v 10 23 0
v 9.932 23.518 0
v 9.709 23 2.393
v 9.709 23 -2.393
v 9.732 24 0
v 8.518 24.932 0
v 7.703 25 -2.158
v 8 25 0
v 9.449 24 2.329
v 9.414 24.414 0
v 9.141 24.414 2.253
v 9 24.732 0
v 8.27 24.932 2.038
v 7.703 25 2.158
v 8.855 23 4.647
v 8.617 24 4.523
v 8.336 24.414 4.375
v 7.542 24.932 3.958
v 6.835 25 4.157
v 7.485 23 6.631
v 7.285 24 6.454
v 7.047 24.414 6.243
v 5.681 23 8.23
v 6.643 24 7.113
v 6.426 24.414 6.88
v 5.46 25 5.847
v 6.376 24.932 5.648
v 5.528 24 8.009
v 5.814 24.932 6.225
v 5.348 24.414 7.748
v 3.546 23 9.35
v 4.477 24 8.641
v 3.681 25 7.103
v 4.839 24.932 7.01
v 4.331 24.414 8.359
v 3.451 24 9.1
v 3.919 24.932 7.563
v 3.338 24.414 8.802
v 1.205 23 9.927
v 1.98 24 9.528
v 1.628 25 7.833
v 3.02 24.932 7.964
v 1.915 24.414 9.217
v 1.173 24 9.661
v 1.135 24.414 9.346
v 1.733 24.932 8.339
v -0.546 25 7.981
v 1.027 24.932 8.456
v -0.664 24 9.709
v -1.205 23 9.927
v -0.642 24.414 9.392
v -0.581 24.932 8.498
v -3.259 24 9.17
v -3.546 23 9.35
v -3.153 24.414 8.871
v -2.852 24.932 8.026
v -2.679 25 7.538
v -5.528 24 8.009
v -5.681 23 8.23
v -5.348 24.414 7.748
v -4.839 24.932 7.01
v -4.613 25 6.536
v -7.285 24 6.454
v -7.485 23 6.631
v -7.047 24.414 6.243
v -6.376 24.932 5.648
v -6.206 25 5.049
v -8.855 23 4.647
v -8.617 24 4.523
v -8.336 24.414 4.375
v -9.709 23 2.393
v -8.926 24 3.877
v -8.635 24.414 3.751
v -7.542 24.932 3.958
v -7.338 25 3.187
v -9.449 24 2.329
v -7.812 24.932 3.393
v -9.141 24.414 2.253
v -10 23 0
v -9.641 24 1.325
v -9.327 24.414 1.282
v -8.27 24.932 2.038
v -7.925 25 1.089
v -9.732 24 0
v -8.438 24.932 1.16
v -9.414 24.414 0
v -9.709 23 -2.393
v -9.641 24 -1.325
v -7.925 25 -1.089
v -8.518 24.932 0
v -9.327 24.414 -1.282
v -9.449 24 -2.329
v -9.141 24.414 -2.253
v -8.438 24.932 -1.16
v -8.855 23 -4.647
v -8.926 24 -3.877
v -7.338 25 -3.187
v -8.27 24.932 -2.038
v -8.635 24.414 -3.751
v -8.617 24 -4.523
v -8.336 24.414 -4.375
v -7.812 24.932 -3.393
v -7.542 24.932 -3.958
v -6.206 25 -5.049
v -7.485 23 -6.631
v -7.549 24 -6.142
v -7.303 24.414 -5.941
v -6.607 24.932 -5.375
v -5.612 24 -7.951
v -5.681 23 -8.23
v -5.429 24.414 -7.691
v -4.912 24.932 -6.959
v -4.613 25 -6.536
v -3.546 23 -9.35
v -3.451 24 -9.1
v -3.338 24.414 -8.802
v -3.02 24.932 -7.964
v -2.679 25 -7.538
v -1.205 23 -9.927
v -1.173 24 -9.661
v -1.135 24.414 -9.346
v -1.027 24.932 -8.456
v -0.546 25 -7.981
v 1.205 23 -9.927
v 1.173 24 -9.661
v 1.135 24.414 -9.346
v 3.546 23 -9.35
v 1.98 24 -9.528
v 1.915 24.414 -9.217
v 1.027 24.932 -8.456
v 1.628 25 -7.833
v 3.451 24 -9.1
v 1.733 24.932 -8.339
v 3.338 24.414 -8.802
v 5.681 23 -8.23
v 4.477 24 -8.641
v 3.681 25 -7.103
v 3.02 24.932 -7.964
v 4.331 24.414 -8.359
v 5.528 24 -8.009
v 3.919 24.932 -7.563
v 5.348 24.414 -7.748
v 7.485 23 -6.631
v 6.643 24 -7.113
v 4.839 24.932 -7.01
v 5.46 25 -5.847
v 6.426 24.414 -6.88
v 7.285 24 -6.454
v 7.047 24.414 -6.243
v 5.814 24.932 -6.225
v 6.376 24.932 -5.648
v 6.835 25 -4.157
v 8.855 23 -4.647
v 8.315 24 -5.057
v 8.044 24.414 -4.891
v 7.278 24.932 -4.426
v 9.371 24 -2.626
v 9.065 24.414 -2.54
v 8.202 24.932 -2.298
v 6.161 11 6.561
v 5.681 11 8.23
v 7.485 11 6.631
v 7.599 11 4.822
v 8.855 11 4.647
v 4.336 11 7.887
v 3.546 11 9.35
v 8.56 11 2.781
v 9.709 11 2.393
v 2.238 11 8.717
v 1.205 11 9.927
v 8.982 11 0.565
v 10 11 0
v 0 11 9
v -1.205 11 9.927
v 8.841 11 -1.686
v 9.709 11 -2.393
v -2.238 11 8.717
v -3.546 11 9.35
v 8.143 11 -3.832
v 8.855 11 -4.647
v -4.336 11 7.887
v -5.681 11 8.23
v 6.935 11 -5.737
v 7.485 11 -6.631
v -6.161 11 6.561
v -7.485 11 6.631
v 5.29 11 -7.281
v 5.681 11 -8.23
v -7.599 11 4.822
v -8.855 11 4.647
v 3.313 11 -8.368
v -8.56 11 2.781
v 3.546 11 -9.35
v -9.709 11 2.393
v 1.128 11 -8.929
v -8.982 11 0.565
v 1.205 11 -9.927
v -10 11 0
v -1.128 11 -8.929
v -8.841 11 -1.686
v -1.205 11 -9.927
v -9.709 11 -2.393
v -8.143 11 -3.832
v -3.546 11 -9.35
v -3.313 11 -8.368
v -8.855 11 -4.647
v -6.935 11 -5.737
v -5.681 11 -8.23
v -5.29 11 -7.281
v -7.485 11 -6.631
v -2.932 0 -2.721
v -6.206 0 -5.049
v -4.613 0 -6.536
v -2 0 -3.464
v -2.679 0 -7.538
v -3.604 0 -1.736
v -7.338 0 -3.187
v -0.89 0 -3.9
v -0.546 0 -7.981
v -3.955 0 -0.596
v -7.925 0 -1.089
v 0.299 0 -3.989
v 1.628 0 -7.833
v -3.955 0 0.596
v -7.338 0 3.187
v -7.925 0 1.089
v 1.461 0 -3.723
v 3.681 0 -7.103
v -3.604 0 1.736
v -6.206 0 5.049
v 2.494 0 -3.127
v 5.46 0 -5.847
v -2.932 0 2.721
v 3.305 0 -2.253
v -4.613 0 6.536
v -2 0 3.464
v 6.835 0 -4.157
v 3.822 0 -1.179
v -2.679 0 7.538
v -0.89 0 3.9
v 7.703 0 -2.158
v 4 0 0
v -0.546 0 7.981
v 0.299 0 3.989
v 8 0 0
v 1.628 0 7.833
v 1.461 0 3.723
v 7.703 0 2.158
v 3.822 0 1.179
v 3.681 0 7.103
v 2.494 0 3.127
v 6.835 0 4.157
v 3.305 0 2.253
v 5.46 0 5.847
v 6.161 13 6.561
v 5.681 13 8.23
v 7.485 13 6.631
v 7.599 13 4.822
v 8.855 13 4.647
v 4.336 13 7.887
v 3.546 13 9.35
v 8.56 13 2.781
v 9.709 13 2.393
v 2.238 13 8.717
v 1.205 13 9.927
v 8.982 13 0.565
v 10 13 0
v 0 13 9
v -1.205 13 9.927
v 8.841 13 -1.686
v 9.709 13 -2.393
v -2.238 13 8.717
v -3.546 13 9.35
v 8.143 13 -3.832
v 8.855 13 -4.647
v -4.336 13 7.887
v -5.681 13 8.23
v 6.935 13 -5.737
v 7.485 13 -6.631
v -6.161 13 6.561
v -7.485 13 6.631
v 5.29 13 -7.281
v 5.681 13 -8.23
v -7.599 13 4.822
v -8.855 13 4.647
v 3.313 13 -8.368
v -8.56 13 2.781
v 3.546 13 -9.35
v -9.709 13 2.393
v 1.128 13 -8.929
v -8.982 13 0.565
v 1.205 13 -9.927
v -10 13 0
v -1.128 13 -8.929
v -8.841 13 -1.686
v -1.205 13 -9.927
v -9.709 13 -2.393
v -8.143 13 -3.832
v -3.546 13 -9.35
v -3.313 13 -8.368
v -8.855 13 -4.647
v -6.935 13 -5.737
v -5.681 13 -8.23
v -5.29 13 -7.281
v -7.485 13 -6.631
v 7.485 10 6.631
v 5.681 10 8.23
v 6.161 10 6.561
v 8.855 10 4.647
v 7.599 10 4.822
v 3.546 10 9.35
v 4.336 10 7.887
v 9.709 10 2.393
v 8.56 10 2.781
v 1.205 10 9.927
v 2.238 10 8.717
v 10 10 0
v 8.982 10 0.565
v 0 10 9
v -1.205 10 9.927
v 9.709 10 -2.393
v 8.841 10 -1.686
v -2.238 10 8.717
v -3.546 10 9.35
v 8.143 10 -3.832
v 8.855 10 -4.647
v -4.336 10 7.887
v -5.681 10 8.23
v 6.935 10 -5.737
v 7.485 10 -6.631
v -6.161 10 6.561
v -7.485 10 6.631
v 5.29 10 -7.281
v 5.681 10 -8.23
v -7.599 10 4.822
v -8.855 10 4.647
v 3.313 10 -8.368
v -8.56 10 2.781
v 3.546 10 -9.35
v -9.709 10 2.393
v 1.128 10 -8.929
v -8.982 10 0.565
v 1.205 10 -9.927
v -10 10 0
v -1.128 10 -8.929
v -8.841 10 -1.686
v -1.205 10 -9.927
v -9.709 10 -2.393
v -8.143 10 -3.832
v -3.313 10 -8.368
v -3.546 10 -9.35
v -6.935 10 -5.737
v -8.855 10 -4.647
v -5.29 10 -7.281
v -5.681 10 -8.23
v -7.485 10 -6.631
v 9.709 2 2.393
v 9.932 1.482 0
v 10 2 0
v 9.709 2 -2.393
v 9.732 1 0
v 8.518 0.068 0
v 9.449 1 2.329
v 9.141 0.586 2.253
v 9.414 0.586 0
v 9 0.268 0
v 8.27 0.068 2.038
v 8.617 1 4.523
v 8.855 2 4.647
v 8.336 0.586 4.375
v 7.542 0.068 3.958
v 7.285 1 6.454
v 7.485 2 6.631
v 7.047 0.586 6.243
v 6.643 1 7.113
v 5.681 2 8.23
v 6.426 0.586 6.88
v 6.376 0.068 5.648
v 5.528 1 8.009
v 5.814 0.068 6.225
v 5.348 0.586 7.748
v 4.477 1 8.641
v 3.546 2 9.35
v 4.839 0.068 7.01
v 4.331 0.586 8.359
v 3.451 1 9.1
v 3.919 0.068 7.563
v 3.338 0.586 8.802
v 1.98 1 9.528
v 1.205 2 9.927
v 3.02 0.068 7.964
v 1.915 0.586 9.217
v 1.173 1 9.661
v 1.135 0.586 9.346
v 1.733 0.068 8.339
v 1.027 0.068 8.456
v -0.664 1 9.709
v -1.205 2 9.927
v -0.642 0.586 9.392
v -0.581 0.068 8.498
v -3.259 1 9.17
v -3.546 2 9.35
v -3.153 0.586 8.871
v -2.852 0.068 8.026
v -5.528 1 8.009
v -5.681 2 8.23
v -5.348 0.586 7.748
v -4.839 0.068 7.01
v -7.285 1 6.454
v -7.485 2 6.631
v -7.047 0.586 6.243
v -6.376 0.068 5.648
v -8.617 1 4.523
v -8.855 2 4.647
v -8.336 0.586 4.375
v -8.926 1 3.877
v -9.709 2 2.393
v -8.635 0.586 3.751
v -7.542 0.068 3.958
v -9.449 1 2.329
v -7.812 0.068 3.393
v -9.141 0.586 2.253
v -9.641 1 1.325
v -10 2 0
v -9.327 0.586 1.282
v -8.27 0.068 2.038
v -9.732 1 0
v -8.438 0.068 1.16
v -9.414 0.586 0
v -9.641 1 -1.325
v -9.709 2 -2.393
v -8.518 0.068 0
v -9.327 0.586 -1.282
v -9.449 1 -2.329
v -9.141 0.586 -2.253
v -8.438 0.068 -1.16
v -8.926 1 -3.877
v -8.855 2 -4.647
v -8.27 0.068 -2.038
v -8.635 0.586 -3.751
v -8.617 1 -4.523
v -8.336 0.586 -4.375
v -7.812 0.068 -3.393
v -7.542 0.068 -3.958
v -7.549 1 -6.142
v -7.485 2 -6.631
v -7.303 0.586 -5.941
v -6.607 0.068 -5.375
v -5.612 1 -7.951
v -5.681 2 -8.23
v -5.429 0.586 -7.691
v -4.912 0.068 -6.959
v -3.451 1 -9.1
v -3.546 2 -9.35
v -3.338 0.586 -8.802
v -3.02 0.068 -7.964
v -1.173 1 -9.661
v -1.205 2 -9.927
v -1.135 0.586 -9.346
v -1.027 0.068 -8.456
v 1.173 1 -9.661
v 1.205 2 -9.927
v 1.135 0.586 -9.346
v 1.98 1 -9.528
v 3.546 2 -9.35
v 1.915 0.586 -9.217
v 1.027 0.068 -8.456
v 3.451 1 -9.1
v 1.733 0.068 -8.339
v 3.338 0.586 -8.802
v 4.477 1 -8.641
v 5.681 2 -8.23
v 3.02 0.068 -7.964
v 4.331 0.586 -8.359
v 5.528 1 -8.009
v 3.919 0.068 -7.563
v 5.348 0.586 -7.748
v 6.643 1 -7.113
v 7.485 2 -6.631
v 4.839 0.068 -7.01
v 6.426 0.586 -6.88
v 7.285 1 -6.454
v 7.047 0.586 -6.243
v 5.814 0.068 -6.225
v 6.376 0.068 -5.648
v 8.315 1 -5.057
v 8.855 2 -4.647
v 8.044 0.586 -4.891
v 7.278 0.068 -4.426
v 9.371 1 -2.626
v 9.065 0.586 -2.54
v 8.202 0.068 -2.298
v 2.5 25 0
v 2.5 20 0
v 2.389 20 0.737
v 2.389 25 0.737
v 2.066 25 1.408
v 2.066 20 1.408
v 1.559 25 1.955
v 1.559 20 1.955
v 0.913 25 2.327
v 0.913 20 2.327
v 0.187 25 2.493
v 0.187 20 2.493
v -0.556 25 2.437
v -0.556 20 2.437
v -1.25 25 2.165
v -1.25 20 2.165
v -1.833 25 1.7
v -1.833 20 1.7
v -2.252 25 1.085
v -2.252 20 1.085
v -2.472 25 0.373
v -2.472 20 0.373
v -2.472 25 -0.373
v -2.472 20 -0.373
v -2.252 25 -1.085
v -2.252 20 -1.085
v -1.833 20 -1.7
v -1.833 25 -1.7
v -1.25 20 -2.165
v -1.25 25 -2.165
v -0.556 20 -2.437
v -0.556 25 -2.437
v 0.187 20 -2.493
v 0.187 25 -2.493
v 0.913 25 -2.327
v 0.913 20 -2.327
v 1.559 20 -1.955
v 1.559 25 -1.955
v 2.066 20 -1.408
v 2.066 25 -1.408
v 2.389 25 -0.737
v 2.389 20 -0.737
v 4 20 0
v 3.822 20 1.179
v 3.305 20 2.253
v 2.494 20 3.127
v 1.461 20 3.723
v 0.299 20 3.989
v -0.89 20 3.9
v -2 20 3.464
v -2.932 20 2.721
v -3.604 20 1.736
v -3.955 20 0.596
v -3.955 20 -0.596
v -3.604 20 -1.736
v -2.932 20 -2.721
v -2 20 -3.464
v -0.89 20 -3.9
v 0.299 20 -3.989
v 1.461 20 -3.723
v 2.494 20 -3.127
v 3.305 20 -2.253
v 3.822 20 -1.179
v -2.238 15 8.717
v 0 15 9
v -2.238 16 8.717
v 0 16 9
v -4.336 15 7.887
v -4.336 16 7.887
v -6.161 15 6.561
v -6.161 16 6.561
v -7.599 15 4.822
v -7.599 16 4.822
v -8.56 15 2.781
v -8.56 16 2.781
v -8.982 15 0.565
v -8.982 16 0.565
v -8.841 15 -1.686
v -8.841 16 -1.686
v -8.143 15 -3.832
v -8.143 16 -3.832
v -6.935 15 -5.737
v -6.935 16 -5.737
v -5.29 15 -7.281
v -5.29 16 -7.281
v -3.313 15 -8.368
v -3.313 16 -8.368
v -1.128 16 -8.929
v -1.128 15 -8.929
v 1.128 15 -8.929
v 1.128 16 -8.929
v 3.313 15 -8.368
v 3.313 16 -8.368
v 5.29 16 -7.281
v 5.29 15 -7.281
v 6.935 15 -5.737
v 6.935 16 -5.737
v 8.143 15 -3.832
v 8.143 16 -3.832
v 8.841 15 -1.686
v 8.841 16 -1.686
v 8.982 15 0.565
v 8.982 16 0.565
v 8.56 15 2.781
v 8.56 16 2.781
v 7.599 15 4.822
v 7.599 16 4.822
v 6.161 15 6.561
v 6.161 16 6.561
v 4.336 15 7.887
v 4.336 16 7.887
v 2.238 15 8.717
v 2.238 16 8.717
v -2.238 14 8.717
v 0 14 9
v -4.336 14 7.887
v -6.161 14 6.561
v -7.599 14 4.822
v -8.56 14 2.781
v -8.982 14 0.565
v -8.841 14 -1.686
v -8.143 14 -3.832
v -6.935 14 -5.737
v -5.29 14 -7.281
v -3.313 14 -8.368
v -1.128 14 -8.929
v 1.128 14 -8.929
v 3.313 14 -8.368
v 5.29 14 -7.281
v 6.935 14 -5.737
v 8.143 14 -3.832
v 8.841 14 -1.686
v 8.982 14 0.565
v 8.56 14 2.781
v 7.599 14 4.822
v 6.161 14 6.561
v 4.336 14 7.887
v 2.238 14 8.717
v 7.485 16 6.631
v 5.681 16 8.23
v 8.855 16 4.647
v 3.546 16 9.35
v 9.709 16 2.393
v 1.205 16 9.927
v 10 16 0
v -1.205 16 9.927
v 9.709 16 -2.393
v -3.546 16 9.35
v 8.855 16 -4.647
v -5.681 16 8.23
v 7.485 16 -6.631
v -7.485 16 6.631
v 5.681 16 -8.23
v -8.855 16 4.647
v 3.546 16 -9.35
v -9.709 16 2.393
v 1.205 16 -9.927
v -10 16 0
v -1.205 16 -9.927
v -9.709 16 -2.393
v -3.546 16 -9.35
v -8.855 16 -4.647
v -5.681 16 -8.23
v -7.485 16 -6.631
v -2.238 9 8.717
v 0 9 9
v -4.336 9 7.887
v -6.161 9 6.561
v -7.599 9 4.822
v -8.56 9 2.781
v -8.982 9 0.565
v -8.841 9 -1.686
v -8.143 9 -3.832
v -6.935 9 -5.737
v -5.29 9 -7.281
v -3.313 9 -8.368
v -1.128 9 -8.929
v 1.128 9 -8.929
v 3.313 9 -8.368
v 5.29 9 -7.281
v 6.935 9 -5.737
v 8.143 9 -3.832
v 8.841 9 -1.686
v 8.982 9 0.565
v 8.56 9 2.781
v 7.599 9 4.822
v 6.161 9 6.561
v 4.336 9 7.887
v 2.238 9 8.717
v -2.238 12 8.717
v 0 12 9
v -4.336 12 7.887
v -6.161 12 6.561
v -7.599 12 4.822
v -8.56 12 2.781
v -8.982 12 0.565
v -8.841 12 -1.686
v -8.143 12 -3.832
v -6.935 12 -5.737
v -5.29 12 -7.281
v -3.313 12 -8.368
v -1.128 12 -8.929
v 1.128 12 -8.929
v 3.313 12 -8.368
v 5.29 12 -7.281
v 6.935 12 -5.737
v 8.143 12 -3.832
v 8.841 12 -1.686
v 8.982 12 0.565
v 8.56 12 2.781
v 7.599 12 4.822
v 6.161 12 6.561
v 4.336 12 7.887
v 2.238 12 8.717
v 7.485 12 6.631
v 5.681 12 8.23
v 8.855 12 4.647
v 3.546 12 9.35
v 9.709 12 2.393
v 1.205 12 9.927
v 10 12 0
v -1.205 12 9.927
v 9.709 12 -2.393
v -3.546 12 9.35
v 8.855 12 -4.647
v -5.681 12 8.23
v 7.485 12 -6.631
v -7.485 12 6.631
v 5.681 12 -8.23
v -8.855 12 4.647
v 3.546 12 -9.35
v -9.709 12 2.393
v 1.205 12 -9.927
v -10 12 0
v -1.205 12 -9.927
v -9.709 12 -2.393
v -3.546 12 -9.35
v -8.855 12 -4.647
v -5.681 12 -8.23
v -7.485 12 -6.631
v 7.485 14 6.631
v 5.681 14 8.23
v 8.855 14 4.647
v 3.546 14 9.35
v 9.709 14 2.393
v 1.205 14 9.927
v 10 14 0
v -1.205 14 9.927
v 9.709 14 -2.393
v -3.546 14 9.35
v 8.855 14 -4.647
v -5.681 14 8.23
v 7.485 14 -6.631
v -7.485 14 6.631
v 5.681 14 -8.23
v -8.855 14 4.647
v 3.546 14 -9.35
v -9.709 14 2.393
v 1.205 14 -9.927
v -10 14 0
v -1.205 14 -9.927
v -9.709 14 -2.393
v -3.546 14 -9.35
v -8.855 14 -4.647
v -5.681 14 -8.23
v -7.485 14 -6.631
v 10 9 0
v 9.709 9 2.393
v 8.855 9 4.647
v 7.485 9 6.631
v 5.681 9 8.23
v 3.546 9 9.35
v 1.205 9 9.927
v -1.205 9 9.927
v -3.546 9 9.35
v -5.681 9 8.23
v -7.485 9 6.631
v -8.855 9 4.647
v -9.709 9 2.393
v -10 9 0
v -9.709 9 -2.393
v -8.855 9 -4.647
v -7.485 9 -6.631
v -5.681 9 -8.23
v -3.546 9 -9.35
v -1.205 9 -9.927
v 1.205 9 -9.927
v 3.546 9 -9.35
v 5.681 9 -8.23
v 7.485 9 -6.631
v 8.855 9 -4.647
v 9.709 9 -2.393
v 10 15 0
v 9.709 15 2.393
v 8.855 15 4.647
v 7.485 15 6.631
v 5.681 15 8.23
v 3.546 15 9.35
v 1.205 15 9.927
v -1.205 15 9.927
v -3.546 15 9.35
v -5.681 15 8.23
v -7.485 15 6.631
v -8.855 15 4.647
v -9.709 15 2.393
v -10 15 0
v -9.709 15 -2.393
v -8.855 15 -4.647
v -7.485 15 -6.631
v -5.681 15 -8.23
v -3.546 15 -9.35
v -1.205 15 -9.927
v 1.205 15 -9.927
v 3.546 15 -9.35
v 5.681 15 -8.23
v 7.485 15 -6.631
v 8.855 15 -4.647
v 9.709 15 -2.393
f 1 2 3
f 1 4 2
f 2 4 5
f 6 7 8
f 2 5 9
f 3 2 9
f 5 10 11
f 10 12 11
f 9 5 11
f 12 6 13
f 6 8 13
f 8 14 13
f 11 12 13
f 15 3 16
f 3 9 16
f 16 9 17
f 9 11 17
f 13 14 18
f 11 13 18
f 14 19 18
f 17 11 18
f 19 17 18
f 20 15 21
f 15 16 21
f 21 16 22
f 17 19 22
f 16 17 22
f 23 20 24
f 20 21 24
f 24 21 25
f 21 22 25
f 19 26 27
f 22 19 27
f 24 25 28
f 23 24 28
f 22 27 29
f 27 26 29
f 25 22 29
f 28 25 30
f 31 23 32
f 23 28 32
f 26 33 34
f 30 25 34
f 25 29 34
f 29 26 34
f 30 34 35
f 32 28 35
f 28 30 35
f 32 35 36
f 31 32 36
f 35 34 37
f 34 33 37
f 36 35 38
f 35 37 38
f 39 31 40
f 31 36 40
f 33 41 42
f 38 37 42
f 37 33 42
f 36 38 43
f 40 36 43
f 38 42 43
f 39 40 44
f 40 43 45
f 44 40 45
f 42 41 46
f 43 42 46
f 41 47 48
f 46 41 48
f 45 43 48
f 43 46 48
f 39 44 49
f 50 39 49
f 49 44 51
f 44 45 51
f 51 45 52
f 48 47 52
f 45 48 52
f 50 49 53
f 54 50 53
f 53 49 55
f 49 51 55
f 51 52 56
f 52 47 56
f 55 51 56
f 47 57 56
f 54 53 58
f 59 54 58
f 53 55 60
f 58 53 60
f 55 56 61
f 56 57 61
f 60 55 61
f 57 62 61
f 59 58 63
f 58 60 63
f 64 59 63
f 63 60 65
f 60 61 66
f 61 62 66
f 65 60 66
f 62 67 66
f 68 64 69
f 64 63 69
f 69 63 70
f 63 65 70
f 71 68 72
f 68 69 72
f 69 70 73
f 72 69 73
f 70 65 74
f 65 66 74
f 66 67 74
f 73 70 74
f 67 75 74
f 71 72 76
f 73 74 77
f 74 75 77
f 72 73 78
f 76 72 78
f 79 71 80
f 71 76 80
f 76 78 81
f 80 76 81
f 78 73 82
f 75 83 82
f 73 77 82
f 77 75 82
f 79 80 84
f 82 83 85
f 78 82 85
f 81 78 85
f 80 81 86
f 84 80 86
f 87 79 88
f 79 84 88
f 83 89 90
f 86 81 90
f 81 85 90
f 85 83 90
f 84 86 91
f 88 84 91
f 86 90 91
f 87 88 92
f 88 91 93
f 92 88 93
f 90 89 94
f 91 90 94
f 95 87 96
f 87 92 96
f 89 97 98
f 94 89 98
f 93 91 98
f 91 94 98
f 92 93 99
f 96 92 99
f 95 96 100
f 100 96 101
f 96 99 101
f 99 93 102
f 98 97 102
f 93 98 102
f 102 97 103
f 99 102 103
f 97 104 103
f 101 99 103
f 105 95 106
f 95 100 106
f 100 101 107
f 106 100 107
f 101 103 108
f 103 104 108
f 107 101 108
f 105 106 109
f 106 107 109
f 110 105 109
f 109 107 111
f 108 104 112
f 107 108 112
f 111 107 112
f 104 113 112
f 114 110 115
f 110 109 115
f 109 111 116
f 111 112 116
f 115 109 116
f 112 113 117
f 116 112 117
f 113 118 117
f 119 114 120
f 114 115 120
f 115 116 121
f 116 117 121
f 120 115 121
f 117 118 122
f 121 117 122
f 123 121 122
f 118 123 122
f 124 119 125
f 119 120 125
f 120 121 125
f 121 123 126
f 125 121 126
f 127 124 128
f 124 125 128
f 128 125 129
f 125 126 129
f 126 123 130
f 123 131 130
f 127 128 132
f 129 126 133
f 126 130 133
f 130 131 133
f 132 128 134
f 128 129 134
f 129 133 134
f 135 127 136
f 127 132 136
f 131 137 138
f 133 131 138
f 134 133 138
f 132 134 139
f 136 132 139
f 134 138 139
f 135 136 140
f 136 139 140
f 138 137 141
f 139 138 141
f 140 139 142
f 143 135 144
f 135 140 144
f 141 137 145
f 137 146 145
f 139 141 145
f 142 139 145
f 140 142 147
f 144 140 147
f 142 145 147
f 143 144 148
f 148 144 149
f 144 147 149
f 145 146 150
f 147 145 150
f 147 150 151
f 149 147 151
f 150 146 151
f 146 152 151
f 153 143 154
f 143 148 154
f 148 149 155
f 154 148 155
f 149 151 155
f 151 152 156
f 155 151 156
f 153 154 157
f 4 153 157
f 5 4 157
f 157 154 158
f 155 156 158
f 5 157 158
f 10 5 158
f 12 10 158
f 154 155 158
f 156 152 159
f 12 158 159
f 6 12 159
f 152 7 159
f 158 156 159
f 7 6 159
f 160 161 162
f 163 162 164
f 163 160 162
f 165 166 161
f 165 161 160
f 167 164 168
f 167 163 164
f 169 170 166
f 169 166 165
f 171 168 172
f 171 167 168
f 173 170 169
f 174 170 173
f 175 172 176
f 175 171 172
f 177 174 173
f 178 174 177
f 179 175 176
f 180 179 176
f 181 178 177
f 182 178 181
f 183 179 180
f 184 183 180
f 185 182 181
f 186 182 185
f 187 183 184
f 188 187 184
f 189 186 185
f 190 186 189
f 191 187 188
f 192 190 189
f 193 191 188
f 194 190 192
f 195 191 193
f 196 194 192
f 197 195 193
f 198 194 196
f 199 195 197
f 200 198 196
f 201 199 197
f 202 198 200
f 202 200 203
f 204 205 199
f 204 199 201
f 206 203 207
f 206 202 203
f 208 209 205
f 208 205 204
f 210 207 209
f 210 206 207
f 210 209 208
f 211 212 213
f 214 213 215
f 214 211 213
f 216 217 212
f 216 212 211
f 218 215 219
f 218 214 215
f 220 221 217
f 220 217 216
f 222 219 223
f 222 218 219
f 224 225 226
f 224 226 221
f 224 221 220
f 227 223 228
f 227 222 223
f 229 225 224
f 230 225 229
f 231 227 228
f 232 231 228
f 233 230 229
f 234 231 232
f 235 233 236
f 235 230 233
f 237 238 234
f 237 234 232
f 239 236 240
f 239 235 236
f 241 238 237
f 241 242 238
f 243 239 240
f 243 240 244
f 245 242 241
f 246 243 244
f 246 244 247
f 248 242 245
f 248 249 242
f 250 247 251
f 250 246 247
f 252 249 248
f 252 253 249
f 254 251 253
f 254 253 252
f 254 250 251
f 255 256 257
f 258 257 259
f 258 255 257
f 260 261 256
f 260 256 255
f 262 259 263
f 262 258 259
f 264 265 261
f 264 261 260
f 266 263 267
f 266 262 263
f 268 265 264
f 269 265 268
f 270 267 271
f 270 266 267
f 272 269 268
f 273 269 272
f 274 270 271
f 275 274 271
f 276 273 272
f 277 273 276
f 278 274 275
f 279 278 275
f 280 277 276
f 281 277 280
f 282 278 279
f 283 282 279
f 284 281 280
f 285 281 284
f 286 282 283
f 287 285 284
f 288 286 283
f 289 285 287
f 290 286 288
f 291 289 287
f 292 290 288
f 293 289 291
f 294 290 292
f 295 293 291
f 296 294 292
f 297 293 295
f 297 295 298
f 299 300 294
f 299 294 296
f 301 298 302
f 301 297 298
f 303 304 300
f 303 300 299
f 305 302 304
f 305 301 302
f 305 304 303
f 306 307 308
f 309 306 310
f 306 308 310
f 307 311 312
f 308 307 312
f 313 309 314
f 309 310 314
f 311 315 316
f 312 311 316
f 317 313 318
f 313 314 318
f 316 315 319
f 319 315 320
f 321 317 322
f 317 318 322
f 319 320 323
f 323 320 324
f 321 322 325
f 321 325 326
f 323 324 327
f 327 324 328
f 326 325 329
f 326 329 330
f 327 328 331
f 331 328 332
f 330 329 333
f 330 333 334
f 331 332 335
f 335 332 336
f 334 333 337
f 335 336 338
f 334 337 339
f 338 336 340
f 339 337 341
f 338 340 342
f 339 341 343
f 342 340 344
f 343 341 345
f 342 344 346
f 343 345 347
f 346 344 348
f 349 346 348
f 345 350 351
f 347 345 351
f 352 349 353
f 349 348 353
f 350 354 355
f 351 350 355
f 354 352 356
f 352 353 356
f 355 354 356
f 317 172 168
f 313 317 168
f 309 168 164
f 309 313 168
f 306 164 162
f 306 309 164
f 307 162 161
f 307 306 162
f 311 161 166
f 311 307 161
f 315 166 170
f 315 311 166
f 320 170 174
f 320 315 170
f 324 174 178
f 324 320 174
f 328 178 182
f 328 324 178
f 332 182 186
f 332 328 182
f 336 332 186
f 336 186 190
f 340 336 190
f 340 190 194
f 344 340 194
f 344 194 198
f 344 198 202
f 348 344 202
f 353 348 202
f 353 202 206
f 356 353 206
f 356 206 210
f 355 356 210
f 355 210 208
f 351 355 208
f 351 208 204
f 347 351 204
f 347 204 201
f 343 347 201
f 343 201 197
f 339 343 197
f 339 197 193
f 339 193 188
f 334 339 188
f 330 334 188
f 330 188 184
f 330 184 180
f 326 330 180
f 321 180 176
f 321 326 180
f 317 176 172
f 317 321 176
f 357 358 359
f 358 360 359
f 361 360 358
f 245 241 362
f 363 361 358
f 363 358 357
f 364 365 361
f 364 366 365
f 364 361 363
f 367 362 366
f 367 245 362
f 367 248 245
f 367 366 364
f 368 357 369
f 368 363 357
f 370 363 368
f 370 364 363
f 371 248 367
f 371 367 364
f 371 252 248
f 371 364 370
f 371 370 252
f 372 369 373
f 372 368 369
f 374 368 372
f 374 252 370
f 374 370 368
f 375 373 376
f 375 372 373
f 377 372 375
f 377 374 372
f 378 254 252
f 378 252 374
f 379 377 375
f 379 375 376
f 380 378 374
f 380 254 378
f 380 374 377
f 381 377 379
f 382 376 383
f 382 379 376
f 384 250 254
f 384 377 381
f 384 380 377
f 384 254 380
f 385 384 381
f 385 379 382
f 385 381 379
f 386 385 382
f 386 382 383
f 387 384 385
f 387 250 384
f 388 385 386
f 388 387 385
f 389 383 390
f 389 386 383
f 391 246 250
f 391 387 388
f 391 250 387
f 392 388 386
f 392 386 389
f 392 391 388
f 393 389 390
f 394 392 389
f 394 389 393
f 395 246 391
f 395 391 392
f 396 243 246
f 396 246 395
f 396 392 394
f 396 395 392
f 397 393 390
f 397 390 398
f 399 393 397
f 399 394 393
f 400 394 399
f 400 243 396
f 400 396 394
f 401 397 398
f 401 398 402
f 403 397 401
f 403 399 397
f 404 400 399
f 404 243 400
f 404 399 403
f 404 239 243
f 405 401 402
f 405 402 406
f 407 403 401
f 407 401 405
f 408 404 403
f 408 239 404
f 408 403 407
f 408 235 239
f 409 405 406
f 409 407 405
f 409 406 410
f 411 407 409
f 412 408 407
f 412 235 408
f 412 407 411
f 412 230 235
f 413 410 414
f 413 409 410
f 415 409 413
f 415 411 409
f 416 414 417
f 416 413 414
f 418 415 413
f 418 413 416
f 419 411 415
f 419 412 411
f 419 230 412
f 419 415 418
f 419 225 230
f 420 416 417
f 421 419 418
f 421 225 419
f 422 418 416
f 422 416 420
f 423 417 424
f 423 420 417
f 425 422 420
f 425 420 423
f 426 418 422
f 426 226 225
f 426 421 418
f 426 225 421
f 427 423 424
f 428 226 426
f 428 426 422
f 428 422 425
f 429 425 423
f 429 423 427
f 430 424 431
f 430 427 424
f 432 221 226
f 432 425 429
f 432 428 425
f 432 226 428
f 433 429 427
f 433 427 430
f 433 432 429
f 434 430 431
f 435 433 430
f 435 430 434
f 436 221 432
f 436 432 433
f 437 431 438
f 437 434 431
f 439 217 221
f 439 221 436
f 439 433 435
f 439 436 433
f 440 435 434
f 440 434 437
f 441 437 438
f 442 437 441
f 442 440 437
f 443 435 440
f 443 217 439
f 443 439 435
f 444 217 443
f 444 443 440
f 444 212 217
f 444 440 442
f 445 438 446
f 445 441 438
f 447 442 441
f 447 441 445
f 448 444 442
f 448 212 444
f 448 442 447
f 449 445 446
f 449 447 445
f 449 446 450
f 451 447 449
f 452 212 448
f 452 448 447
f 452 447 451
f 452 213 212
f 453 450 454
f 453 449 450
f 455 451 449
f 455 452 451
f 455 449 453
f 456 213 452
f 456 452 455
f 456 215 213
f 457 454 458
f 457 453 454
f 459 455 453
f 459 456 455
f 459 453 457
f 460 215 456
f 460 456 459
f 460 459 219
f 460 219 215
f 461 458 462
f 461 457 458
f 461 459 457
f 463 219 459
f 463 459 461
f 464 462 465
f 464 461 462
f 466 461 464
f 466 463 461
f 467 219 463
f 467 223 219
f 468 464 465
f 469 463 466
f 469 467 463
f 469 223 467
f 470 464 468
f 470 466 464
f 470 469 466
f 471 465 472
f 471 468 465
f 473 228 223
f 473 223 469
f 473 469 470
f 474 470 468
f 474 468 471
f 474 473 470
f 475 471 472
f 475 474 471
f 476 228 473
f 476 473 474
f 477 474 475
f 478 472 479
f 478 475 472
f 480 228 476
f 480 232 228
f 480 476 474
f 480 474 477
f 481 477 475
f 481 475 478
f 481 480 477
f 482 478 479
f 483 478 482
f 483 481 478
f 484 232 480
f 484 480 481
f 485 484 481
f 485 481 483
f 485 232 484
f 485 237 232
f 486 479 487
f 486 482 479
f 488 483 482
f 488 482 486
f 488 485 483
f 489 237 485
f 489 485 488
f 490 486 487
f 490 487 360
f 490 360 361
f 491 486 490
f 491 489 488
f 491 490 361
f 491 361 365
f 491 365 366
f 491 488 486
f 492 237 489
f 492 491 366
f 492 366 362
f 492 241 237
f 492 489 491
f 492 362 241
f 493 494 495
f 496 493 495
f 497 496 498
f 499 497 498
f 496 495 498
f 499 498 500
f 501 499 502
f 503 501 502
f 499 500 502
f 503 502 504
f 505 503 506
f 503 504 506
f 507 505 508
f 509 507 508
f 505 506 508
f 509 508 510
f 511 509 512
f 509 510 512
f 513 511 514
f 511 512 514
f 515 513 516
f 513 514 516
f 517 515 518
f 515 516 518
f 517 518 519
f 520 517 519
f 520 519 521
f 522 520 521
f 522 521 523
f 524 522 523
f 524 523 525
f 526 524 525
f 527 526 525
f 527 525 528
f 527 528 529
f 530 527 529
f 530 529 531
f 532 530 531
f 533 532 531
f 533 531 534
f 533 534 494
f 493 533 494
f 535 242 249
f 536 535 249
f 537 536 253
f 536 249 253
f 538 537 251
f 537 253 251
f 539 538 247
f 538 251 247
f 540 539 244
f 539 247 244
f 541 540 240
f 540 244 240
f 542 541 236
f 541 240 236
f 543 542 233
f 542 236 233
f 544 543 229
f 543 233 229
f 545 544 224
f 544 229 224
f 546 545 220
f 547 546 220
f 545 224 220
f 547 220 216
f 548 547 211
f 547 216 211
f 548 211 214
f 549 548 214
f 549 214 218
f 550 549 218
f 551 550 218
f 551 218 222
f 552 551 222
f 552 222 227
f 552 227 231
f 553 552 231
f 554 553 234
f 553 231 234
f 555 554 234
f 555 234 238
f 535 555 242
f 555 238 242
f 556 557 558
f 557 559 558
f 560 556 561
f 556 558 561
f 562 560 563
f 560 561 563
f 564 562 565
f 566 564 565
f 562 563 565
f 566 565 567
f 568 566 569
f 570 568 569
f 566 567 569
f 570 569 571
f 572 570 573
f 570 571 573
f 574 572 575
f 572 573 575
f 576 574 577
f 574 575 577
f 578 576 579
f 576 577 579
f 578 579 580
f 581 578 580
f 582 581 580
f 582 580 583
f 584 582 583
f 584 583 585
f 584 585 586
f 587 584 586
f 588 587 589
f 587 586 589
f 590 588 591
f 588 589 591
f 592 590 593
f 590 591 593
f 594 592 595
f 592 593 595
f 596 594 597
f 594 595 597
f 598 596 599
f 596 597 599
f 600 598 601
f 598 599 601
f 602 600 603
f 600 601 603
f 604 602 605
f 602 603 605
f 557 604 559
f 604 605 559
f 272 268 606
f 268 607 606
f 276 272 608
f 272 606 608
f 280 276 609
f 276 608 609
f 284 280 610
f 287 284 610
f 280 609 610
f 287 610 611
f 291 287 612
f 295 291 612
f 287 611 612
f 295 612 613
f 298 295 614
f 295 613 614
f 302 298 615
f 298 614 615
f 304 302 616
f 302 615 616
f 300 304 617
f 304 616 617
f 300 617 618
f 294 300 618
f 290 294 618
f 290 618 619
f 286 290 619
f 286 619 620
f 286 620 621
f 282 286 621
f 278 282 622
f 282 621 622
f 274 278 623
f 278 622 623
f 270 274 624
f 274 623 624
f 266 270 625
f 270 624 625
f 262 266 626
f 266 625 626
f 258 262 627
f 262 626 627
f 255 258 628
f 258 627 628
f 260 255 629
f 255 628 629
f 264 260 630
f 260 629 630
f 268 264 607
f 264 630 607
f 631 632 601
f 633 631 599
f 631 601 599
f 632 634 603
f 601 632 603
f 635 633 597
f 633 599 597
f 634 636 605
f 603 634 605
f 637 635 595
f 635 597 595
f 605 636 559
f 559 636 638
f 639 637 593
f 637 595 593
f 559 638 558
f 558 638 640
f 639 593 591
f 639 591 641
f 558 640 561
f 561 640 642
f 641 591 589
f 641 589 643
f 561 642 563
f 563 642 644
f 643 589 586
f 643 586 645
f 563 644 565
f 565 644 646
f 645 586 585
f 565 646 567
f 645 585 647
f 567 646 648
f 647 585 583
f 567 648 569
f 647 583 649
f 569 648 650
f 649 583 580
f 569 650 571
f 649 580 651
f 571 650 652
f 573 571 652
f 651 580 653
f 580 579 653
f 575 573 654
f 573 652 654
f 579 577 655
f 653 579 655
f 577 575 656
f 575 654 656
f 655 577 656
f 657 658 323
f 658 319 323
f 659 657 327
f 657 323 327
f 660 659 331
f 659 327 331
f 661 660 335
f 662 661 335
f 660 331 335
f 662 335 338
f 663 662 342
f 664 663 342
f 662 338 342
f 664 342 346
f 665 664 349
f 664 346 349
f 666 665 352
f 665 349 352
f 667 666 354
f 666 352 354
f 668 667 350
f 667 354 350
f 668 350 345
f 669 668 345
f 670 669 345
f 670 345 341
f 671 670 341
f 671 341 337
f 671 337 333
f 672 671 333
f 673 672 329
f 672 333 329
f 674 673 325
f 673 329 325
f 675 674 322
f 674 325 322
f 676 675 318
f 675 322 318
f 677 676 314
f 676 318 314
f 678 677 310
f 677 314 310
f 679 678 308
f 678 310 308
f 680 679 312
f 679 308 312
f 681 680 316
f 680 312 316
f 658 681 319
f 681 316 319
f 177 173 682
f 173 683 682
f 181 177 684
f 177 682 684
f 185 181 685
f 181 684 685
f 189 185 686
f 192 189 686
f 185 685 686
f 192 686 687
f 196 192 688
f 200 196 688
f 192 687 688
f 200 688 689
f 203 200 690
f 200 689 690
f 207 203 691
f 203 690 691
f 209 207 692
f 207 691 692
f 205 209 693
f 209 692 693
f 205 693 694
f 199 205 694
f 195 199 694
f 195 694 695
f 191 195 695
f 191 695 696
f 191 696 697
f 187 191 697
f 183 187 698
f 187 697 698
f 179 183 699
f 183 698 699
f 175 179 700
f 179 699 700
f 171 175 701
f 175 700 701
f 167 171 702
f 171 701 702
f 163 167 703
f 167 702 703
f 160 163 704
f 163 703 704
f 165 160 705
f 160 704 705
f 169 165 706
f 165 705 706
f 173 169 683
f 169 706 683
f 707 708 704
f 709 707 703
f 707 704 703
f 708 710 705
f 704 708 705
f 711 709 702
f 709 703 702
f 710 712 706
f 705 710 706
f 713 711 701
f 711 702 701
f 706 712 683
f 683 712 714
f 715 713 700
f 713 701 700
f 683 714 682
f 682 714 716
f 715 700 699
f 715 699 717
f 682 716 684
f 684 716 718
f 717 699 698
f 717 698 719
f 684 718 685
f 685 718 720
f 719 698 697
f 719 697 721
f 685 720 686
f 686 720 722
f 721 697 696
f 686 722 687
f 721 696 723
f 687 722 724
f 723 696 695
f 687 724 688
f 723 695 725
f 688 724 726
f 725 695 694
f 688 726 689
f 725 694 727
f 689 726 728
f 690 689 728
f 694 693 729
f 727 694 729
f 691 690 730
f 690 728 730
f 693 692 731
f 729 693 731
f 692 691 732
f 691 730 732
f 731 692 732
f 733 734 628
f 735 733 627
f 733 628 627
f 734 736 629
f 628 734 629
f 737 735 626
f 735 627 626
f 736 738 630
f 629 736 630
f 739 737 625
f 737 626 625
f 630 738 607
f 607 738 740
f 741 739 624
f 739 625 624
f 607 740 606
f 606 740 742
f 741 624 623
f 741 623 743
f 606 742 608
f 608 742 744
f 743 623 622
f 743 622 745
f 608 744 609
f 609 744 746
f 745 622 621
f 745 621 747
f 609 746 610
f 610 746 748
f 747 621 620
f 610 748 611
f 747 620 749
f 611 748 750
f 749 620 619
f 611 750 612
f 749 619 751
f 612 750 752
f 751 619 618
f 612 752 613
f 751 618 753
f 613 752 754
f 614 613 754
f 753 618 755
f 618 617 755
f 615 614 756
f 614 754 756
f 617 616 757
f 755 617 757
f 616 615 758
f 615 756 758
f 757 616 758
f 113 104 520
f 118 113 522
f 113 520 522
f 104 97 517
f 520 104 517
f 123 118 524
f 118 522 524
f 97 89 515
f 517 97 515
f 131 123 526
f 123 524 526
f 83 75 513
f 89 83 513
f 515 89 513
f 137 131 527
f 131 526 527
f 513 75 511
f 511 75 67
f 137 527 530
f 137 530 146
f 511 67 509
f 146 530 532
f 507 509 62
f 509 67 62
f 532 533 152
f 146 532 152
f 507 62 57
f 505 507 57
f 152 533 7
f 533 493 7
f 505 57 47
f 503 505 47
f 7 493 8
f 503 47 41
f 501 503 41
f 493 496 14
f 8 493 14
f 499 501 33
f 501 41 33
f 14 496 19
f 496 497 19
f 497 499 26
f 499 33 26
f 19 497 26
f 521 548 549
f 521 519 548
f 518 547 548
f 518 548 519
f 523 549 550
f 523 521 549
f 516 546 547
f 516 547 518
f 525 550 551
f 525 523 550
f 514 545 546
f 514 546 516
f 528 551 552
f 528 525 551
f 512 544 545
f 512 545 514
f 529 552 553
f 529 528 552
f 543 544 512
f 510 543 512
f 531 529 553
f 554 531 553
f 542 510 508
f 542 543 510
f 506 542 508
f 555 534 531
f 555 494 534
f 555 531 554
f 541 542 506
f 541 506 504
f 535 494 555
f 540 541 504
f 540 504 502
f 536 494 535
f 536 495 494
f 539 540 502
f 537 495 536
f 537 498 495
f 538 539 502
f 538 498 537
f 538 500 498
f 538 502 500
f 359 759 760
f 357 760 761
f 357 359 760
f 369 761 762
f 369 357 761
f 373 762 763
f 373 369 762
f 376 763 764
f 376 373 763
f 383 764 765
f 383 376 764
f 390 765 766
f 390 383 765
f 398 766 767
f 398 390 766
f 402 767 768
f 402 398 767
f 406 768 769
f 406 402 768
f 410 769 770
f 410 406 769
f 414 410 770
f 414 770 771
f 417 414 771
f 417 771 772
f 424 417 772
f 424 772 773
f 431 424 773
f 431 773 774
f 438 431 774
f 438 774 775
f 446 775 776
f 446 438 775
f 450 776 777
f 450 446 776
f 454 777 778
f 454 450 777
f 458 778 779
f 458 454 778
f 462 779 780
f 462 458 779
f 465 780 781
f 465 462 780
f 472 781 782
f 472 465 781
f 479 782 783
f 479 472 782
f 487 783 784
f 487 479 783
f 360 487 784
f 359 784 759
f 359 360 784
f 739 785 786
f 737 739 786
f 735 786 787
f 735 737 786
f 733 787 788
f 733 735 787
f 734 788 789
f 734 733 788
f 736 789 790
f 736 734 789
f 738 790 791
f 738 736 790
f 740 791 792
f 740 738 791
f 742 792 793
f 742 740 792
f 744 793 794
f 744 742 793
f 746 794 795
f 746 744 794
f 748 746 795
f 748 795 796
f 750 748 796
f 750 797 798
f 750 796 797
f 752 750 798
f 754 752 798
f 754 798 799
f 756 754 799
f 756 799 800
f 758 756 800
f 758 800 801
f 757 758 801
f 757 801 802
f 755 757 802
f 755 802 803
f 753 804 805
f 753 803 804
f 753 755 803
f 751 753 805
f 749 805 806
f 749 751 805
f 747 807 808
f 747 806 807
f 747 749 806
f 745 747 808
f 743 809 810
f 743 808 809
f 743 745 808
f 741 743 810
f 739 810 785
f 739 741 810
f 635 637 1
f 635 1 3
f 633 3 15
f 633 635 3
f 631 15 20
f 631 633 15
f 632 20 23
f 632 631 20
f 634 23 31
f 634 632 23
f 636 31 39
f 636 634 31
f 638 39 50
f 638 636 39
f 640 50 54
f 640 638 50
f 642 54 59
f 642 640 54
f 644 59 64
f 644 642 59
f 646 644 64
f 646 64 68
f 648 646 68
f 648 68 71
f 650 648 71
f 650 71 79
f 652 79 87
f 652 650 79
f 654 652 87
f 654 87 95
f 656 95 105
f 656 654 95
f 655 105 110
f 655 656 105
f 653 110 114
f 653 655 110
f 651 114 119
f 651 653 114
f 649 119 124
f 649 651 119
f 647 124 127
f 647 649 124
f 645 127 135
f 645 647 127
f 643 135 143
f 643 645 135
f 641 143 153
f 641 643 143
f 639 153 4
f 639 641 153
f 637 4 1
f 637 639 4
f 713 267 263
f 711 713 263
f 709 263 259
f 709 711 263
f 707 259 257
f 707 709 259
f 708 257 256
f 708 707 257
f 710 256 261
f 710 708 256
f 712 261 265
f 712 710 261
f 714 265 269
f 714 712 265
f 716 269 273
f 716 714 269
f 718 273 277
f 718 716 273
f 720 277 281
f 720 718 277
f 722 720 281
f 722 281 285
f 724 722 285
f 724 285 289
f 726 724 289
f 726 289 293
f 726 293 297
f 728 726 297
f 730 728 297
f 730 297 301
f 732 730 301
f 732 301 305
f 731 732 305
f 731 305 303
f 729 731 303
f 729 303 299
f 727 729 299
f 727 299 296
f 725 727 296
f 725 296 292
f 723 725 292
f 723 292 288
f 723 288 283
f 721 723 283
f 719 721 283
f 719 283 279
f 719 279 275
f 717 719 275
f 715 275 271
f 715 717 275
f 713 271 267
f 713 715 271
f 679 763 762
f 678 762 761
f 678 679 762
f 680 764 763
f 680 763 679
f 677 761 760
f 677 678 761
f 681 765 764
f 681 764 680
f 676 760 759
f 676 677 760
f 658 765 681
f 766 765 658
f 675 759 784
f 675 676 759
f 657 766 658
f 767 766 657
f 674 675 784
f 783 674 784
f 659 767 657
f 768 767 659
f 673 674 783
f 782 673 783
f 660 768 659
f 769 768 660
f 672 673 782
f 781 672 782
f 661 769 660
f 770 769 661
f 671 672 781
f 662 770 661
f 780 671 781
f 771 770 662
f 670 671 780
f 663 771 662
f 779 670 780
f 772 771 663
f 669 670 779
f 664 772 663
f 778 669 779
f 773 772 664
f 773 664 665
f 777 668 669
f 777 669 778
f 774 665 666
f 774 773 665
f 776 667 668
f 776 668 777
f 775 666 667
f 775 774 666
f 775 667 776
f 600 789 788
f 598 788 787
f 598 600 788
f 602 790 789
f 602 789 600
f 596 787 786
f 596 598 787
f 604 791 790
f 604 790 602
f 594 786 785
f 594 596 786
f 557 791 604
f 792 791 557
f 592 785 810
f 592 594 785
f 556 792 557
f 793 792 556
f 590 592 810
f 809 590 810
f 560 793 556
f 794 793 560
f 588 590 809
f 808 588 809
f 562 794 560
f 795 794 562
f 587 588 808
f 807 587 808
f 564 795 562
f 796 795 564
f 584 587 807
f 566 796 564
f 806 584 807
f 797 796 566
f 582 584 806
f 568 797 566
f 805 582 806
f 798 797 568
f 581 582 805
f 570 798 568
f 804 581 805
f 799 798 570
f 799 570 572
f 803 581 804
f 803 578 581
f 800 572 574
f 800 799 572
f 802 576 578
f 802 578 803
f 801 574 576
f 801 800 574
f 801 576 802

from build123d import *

# Parameters (mm, degrees)
F0_R     = 10
F0_R_2   = 2.5
F1_DEPTH = 25
F2_W     = 1
F2_H     = 1
F4_R     = 2
F5_R     = 4
F6_DEPTH = 20


with BuildPart() as f1:
    # F0 (on Front) → F1 (new body)
    with BuildSketch(Plane.XZ):
        Circle(F0_R)
        Circle(F0_R_2, mode=Mode.SUBTRACT)
    extrude(amount=-F1_DEPTH)

    # F2 (on Right) → F3 (revolve, cut)
    with BuildSketch(Plane.YZ):
        with Locations((11.5, 9.5)):
            Rectangle(F2_W, F2_H)
        with Locations((9.5, 9.5)):
            Rectangle(F2_W, F2_H)
        with Locations((13.5, 9.5)):
            Rectangle(F2_W, F2_H)
        with Locations((15.5, 9.5)):
            Rectangle(F2_W, F2_H)
    revolve(axis=Axis((0, 25, 0), (0, -1, 0)), mode=Mode.SUBTRACT)

    # F4
    f4_edges = [f1.edges().sort_by_distance(p)[0] for p in [
        (-10, 0, 0),
        (-10, 25, 0),
    ]]
    fillet(f4_edges, radius=F4_R)

    # F5 (on face) → F6 (cut)
    with BuildSketch(Plane.XZ):
        Circle(F5_R)
    extrude(amount=-F6_DEPTH, mode=Mode.SUBTRACT)


solid = f1.part
